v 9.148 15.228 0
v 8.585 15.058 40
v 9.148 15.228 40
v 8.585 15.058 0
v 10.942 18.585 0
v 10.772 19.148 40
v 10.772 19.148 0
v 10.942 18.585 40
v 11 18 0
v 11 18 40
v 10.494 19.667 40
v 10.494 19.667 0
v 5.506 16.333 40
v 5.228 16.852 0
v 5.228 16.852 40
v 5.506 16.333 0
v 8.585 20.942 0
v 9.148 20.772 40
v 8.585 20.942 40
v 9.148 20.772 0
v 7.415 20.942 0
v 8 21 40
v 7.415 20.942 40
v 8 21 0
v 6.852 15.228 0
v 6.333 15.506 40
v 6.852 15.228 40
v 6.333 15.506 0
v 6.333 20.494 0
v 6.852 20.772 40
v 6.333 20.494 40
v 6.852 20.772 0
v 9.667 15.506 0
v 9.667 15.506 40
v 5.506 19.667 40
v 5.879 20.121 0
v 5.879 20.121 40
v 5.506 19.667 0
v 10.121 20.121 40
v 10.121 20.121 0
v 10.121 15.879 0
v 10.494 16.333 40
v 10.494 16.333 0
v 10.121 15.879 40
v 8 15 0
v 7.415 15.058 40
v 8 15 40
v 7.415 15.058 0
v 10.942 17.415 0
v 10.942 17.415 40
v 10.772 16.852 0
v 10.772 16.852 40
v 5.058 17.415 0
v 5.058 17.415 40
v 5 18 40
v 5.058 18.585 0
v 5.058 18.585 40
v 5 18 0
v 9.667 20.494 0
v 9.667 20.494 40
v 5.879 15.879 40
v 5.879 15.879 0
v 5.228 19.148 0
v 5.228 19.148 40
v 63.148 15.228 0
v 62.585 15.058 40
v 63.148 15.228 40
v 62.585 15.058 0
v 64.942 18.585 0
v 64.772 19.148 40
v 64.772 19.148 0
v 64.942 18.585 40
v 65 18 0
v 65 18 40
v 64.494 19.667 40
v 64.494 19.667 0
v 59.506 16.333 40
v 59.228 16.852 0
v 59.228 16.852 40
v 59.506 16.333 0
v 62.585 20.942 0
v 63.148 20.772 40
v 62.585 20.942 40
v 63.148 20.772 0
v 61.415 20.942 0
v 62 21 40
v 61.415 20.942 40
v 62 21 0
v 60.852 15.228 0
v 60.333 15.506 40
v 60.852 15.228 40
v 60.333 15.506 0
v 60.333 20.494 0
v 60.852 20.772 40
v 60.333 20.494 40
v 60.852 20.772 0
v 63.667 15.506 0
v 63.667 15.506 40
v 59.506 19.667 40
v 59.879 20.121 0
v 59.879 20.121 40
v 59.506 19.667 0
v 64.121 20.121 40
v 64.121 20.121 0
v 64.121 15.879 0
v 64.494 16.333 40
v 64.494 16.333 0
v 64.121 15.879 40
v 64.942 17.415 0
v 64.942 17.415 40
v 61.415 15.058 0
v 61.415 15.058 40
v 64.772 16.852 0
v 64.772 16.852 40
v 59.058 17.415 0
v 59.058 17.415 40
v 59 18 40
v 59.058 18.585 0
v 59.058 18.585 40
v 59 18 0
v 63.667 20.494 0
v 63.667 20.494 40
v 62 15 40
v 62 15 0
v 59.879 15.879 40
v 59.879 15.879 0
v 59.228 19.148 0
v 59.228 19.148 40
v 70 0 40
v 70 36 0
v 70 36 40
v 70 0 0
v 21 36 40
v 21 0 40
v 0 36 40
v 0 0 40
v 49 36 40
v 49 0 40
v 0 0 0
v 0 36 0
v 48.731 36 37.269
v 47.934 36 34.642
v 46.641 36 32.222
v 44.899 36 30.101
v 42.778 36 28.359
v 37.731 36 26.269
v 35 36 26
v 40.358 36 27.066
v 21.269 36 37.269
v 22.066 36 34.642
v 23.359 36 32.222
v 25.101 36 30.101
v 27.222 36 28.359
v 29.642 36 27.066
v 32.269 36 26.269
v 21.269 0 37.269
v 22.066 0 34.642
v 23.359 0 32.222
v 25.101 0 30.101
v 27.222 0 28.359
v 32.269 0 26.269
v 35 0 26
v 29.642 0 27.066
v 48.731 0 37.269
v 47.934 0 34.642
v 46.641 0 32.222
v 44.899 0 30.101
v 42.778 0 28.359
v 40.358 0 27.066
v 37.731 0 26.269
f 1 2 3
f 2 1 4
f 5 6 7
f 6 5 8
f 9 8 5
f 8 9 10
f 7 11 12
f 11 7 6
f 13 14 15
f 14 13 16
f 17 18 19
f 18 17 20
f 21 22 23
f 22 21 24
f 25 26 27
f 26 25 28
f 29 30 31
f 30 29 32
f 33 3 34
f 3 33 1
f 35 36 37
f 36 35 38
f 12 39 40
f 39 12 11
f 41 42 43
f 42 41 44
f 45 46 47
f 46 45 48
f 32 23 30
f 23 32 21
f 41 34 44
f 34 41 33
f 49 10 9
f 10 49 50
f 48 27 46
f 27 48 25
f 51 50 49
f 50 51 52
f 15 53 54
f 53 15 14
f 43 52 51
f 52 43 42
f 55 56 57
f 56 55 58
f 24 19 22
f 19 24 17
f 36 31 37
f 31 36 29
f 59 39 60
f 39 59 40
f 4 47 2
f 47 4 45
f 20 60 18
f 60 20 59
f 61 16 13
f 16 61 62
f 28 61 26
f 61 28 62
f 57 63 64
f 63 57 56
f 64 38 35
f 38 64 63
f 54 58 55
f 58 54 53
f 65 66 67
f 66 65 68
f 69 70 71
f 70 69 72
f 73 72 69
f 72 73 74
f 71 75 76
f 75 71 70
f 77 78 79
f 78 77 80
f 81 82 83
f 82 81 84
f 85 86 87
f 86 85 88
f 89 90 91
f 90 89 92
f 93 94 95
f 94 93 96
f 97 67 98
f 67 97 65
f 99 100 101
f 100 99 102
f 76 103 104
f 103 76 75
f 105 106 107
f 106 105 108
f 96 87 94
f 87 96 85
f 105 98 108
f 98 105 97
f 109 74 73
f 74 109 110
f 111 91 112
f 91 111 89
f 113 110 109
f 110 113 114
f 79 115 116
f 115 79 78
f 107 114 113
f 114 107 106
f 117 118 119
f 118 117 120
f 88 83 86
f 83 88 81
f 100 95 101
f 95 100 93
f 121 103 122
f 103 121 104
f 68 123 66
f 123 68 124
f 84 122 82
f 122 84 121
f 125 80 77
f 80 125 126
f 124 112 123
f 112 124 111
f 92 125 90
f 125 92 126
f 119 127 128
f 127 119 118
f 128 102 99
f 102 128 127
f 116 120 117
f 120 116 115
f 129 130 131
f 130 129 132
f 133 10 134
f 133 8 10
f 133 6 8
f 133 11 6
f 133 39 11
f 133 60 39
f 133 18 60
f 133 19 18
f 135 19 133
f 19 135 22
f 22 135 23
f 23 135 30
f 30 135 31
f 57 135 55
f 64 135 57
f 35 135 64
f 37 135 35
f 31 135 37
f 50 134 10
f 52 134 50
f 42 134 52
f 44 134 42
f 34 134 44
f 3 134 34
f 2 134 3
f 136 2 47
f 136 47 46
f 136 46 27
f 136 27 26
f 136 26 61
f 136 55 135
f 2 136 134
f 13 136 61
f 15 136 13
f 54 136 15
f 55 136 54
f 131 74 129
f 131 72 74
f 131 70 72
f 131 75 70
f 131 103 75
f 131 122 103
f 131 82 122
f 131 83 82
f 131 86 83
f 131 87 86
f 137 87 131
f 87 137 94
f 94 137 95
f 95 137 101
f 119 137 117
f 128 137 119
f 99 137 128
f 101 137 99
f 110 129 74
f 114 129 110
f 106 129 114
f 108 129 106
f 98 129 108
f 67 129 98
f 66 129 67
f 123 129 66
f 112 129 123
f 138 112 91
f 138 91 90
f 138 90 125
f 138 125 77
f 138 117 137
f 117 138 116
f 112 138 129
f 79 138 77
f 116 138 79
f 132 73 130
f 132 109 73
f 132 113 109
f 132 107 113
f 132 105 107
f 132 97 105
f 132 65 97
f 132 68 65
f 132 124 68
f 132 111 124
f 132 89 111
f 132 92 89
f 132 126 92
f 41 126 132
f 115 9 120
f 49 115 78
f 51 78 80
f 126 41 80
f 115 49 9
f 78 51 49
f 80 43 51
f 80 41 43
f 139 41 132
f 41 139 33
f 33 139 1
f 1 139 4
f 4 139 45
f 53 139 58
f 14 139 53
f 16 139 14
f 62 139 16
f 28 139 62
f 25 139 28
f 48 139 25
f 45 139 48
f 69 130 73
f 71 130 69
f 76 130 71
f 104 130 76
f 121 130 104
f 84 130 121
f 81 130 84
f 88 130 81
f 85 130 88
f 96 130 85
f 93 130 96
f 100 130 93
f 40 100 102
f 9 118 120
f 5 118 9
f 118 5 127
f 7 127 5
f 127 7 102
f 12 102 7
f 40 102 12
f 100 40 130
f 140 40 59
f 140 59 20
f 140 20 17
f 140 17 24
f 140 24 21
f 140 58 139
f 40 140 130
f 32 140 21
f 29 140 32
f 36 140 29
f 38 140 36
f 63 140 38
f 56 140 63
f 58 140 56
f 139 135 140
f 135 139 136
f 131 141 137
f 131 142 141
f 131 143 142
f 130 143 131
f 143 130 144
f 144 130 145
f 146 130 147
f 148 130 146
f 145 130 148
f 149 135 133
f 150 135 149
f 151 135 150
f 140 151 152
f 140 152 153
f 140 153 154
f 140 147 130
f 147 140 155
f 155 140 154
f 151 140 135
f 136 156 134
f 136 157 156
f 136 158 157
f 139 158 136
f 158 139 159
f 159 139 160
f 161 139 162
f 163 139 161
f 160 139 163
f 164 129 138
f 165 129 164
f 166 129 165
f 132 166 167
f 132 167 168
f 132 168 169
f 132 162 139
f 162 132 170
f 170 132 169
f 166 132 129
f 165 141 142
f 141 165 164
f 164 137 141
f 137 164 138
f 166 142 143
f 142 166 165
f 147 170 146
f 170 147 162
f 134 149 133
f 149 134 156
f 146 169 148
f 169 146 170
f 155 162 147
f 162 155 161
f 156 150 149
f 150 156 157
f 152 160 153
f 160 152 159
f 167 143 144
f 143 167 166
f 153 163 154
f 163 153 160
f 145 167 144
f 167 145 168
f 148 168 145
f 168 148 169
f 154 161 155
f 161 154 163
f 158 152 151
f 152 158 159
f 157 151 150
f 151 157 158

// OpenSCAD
$fn = 32;

// ----------------------------------------------------------------------
// Saddle clamp: plain shaft clamp
// ----------------------------------------------------------------------

// --- parameters (mm) ---
blk_l = 70;               // block length, X
blk_w = 36;               // block width, Y
blk_h = 40;               // block height
clamp_r = 14;             // shaft groove radius
hole_r = 3;               // bolt hole radius
hole_m = 8;               // bolt hole margin from the ends

saw_depth = clamp_r + 3;  // saw kerf depth

difference() {
  cube([blk_l, blk_w, blk_h]);
  translate([blk_l / 2, -1, blk_h])
    rotate([-90, 0, 0])
      cylinder(h = blk_w + 2, r = clamp_r);
  for (sx = [0, 1])
    translate([sx ? blk_l - hole_m : hole_m, blk_w / 2, -1])
      cylinder(r = hole_r, h = blk_h + 2);
}
